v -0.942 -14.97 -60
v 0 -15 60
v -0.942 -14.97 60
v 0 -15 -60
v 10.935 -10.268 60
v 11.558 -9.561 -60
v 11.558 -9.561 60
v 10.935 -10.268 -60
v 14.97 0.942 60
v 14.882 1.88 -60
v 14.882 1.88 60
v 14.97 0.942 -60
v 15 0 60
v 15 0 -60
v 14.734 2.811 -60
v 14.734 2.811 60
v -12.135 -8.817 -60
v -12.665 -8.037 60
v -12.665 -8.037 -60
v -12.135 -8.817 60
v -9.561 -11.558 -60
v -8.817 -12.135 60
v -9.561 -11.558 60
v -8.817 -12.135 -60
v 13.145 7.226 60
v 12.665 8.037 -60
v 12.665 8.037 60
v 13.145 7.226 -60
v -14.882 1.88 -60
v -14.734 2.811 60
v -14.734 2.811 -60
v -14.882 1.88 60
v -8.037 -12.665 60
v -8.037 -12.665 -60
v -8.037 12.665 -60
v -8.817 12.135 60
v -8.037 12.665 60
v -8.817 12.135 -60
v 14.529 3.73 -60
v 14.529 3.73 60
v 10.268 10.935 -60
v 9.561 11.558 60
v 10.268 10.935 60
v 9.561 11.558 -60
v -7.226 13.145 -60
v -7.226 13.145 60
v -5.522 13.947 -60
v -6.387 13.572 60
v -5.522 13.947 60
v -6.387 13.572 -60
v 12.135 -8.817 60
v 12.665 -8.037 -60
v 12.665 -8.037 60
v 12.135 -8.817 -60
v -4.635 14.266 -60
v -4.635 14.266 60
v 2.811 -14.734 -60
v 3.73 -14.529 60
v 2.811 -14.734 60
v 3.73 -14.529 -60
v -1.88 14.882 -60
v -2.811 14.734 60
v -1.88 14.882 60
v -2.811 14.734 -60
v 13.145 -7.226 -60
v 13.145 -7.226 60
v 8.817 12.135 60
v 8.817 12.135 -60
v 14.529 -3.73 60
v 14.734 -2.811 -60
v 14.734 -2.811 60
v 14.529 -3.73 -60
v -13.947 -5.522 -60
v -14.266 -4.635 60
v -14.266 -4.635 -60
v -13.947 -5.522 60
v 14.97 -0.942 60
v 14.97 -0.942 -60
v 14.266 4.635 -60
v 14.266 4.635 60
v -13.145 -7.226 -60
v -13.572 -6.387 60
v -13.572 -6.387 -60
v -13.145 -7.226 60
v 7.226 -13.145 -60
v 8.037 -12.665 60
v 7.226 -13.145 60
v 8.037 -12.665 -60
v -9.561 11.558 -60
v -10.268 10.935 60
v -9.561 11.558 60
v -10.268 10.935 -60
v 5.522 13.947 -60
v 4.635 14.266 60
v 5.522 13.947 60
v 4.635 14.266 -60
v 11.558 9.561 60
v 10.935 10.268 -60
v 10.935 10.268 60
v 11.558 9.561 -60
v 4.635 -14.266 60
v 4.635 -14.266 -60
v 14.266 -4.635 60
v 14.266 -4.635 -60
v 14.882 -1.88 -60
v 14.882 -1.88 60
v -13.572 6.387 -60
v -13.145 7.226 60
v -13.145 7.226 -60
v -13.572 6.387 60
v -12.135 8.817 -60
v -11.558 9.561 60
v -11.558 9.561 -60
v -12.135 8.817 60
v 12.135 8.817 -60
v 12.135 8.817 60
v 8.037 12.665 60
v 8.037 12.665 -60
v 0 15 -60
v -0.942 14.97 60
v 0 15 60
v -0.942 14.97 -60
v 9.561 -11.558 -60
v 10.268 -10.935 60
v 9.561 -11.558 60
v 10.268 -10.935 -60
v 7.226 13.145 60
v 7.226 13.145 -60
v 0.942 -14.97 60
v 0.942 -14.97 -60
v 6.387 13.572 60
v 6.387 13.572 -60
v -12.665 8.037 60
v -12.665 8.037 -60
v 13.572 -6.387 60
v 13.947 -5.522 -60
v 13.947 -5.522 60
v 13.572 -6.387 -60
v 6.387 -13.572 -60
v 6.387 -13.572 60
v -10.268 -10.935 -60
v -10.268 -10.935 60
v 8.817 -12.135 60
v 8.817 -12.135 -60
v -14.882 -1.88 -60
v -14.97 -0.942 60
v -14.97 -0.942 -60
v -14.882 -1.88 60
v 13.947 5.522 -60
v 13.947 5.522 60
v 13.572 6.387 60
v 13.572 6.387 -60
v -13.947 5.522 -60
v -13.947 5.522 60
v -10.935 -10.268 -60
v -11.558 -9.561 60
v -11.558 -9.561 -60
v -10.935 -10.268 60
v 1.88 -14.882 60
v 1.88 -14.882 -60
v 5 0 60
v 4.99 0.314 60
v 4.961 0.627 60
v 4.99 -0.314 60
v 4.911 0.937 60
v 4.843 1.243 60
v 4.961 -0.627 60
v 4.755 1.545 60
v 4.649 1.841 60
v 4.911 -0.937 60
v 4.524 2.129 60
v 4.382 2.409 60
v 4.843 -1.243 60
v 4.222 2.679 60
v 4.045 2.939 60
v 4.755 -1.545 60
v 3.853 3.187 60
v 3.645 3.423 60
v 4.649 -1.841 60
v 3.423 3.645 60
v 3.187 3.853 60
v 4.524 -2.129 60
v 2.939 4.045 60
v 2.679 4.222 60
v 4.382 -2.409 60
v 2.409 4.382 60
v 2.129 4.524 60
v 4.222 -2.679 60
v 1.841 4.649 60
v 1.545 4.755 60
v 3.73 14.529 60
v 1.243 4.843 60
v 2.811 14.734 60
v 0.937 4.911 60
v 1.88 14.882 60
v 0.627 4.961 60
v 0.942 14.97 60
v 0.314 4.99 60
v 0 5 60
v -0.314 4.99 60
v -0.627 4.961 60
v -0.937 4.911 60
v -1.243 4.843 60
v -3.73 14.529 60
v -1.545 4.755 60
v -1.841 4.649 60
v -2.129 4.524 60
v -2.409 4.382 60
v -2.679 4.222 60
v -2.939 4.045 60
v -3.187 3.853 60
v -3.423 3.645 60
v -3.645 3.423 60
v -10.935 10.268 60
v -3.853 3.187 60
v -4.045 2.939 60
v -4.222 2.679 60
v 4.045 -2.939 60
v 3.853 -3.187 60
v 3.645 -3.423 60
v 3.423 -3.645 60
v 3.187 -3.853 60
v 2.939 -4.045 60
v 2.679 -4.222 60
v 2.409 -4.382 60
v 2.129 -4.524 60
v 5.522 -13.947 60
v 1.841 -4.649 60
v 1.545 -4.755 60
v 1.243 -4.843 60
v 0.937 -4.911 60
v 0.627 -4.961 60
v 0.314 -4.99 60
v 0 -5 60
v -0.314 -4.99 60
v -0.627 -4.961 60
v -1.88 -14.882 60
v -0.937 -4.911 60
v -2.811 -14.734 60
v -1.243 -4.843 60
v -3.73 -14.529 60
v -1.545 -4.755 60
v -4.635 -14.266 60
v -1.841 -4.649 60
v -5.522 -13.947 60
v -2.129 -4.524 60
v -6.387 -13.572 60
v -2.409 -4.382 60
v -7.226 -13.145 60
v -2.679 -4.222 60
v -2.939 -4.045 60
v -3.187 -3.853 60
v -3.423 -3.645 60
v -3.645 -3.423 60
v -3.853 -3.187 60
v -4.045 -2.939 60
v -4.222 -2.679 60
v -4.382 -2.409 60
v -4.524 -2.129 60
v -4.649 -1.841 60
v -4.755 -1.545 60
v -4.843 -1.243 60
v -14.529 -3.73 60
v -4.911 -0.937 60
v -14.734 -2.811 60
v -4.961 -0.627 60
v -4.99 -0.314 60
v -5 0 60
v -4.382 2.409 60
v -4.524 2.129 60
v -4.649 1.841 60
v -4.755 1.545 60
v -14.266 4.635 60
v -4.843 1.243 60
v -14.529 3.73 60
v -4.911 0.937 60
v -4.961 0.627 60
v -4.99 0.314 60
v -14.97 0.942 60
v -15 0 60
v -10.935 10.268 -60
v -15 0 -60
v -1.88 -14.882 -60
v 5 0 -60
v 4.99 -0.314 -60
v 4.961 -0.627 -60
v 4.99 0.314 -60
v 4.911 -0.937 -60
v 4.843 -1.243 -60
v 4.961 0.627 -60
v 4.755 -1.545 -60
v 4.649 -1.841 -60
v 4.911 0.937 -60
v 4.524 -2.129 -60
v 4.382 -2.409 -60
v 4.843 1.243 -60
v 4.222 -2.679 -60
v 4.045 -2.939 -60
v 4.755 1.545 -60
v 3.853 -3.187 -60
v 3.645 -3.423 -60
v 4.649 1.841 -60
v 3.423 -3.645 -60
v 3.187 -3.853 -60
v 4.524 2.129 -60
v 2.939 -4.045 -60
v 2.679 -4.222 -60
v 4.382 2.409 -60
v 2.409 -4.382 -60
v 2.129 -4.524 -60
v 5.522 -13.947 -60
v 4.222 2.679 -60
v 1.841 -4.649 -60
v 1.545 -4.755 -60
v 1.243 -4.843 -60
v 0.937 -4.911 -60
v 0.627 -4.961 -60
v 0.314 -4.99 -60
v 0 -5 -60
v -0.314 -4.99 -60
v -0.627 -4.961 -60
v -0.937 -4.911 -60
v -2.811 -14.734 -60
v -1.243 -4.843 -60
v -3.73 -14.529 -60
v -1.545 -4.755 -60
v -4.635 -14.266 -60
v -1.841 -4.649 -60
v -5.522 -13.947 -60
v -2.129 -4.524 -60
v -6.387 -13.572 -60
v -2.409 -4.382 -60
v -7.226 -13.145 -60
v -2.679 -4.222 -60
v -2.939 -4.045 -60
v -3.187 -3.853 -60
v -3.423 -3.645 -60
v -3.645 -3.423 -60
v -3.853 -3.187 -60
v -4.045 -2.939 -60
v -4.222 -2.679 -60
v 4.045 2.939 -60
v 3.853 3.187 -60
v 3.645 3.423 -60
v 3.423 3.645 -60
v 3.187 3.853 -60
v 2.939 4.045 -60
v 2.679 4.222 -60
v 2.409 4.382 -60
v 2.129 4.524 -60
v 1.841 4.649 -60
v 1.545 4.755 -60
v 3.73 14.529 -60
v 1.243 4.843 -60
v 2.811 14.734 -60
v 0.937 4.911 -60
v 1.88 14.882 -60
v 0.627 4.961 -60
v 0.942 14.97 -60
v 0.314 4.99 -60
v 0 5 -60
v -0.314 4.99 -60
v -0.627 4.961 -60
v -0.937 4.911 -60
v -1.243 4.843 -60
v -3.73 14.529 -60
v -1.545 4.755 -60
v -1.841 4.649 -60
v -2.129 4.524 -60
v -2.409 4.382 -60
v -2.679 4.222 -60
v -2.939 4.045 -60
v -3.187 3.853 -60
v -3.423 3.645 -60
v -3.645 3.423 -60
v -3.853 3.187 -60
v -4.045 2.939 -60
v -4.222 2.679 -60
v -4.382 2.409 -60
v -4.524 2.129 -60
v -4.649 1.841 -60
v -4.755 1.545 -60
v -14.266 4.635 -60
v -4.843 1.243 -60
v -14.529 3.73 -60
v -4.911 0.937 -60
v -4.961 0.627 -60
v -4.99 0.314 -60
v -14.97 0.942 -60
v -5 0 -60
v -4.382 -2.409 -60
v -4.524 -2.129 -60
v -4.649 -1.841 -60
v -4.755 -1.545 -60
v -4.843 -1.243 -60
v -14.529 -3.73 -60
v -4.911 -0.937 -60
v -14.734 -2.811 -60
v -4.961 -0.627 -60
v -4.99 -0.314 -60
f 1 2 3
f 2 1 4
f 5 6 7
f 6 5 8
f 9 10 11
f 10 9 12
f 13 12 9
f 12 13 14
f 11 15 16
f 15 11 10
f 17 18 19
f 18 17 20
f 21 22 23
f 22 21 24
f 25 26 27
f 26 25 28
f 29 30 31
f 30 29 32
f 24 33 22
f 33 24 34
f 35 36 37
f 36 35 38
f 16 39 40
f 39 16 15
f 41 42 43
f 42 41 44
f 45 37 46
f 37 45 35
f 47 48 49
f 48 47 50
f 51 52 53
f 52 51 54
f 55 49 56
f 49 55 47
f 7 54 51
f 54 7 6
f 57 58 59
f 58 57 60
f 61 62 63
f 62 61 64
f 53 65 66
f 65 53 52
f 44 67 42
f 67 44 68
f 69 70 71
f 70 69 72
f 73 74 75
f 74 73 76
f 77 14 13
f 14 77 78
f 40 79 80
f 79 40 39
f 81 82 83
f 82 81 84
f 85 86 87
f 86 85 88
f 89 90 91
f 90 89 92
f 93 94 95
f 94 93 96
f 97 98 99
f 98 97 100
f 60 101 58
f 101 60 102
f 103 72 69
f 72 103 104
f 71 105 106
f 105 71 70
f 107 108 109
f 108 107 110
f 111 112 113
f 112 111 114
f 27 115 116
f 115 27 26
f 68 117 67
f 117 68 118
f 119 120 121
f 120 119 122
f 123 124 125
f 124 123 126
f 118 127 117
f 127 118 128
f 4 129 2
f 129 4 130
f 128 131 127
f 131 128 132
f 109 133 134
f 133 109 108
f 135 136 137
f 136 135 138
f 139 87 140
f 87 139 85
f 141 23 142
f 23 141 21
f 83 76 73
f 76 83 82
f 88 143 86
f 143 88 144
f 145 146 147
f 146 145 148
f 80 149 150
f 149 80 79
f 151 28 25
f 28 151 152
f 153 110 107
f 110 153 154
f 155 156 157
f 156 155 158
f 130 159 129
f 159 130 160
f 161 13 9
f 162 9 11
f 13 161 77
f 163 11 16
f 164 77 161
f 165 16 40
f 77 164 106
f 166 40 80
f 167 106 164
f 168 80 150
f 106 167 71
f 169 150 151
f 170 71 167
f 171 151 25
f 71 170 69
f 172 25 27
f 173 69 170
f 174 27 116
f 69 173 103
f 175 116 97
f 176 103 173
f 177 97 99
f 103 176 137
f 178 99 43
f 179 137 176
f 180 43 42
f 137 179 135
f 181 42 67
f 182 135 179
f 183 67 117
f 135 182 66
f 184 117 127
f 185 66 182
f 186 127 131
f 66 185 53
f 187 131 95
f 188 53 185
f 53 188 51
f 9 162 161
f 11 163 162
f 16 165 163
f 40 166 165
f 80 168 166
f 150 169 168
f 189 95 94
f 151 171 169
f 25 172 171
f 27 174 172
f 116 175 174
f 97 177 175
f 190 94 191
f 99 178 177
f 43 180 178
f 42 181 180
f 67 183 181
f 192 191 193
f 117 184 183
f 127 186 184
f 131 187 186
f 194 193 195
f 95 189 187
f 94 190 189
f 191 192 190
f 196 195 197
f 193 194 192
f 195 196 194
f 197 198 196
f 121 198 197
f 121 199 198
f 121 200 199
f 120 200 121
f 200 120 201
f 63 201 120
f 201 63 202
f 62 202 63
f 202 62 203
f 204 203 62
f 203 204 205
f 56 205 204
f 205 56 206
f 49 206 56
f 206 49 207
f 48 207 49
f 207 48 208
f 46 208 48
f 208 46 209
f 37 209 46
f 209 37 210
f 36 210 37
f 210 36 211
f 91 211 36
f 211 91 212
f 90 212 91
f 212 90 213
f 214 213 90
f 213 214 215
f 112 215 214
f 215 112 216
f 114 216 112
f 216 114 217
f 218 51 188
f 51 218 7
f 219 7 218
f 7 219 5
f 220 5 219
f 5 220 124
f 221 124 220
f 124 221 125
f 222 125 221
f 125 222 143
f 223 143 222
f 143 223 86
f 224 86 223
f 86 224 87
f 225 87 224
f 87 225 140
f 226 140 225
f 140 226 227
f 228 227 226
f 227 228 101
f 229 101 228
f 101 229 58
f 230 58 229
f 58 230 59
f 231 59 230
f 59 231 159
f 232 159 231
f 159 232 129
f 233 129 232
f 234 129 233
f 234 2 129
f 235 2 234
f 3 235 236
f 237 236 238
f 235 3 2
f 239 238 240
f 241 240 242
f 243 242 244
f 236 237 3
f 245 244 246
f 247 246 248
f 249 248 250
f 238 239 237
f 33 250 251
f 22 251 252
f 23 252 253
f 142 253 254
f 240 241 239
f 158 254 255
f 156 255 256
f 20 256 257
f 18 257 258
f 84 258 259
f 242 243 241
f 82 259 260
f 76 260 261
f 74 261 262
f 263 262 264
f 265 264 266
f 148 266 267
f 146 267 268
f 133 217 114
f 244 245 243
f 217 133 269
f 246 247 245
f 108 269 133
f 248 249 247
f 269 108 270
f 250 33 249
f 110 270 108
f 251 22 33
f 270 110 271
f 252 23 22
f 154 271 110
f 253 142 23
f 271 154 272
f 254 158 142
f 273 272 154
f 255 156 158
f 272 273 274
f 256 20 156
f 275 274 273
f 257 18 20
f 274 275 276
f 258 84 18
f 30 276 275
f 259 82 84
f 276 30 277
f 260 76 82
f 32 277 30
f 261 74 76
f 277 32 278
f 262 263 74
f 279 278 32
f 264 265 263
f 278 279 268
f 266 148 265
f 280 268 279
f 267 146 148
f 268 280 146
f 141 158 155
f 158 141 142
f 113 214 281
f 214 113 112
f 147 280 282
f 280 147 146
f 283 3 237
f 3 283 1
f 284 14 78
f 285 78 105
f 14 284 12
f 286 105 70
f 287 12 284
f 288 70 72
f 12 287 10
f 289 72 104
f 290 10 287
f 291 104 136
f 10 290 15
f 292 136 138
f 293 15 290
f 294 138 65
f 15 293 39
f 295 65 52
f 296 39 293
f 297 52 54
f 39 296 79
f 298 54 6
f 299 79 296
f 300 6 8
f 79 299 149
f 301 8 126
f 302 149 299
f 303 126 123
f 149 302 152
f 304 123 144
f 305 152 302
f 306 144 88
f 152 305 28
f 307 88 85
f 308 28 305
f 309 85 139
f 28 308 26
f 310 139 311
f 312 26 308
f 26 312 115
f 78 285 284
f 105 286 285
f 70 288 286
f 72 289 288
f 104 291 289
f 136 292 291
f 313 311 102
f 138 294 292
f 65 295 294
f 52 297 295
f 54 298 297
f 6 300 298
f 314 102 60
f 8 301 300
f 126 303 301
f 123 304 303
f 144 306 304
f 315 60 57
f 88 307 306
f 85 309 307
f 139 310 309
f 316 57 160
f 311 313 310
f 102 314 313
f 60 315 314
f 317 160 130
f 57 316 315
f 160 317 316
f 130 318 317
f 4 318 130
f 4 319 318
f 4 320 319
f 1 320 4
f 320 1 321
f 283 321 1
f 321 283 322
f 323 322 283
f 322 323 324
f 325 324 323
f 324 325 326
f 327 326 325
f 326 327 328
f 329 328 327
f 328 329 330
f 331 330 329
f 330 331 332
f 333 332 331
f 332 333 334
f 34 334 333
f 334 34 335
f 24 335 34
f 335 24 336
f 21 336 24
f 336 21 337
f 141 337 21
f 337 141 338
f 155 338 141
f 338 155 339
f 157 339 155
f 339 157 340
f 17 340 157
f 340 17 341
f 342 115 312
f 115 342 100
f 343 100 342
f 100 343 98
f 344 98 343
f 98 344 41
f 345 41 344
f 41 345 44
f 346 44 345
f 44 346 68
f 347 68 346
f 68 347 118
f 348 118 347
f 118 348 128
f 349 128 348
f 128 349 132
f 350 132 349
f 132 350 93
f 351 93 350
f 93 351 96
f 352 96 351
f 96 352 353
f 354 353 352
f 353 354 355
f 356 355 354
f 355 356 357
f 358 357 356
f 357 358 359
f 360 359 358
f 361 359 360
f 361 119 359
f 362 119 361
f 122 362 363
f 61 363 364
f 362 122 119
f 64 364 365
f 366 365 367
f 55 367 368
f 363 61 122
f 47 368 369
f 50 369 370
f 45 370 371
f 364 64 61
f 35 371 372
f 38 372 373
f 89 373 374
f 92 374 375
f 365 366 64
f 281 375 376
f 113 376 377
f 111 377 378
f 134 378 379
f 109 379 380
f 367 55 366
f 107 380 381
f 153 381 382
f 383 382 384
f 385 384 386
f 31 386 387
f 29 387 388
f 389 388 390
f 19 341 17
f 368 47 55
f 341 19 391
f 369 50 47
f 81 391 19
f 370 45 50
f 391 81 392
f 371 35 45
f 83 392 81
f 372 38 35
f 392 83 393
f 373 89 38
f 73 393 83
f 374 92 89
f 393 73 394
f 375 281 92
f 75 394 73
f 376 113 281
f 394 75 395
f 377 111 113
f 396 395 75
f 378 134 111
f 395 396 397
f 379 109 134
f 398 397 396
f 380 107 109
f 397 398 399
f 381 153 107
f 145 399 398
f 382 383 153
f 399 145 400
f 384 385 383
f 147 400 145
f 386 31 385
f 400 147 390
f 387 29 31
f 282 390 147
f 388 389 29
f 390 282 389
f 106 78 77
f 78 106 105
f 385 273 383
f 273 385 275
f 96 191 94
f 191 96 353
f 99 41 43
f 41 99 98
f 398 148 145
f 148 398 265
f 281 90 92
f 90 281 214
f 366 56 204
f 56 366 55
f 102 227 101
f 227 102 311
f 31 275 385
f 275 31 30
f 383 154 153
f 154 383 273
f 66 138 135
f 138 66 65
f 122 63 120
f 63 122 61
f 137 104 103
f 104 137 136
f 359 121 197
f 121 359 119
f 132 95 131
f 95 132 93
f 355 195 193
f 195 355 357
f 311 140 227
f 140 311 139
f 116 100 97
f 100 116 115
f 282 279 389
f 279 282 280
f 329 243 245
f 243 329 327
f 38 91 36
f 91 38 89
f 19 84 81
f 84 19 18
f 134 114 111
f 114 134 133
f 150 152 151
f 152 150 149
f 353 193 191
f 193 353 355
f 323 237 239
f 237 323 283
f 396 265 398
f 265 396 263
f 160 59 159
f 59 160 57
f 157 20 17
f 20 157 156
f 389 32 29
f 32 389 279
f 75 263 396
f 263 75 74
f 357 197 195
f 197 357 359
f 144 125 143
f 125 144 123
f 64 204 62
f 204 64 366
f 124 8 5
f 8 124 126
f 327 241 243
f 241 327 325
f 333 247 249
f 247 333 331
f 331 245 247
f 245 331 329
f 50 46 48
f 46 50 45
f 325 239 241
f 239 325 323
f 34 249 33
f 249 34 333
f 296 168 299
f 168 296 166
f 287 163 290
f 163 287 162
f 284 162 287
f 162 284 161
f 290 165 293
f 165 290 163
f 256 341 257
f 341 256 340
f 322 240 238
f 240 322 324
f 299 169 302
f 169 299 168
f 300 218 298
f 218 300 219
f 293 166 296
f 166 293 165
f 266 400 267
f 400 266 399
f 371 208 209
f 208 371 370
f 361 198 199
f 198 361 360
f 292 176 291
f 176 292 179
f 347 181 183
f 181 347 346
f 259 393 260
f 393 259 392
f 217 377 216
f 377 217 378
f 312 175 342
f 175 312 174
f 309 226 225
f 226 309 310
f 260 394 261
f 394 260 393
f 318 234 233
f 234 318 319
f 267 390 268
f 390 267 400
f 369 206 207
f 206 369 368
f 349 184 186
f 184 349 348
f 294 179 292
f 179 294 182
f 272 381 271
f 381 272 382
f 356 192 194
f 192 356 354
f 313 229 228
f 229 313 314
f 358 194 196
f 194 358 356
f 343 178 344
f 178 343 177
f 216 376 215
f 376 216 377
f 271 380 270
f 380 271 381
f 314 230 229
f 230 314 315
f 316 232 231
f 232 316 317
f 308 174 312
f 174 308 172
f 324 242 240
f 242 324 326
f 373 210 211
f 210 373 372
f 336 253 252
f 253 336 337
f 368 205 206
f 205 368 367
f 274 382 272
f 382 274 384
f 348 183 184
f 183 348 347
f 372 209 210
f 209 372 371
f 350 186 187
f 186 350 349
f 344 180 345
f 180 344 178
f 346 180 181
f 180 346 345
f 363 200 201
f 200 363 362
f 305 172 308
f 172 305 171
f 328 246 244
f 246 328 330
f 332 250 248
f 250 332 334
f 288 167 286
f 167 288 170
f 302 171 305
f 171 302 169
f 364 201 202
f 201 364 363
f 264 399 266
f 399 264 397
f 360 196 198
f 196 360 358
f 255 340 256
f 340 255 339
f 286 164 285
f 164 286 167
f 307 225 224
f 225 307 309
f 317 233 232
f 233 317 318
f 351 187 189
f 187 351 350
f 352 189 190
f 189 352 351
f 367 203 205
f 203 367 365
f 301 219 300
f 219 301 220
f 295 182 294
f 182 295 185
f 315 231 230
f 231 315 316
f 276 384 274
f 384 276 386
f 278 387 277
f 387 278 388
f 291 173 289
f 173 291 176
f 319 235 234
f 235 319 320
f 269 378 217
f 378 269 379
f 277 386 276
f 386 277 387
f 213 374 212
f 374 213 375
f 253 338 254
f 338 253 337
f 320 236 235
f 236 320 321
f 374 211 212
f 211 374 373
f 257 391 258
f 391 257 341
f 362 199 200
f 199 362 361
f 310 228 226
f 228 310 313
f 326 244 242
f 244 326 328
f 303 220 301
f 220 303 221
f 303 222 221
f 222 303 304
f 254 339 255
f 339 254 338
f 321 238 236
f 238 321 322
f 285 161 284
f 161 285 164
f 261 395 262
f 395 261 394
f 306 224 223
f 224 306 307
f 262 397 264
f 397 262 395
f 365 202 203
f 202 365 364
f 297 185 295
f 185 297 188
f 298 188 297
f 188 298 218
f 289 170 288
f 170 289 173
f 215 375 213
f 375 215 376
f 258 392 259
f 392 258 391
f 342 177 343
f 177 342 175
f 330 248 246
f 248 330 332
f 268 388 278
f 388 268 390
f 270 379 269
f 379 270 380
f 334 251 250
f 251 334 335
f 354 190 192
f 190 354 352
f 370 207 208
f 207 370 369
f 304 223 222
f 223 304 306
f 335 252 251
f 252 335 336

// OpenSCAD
difference() {
    cylinder(h=120, r=15, $fn=100, center=true);
    cylinder(h=140, r=5, $fn=100, center=true);
}
    
